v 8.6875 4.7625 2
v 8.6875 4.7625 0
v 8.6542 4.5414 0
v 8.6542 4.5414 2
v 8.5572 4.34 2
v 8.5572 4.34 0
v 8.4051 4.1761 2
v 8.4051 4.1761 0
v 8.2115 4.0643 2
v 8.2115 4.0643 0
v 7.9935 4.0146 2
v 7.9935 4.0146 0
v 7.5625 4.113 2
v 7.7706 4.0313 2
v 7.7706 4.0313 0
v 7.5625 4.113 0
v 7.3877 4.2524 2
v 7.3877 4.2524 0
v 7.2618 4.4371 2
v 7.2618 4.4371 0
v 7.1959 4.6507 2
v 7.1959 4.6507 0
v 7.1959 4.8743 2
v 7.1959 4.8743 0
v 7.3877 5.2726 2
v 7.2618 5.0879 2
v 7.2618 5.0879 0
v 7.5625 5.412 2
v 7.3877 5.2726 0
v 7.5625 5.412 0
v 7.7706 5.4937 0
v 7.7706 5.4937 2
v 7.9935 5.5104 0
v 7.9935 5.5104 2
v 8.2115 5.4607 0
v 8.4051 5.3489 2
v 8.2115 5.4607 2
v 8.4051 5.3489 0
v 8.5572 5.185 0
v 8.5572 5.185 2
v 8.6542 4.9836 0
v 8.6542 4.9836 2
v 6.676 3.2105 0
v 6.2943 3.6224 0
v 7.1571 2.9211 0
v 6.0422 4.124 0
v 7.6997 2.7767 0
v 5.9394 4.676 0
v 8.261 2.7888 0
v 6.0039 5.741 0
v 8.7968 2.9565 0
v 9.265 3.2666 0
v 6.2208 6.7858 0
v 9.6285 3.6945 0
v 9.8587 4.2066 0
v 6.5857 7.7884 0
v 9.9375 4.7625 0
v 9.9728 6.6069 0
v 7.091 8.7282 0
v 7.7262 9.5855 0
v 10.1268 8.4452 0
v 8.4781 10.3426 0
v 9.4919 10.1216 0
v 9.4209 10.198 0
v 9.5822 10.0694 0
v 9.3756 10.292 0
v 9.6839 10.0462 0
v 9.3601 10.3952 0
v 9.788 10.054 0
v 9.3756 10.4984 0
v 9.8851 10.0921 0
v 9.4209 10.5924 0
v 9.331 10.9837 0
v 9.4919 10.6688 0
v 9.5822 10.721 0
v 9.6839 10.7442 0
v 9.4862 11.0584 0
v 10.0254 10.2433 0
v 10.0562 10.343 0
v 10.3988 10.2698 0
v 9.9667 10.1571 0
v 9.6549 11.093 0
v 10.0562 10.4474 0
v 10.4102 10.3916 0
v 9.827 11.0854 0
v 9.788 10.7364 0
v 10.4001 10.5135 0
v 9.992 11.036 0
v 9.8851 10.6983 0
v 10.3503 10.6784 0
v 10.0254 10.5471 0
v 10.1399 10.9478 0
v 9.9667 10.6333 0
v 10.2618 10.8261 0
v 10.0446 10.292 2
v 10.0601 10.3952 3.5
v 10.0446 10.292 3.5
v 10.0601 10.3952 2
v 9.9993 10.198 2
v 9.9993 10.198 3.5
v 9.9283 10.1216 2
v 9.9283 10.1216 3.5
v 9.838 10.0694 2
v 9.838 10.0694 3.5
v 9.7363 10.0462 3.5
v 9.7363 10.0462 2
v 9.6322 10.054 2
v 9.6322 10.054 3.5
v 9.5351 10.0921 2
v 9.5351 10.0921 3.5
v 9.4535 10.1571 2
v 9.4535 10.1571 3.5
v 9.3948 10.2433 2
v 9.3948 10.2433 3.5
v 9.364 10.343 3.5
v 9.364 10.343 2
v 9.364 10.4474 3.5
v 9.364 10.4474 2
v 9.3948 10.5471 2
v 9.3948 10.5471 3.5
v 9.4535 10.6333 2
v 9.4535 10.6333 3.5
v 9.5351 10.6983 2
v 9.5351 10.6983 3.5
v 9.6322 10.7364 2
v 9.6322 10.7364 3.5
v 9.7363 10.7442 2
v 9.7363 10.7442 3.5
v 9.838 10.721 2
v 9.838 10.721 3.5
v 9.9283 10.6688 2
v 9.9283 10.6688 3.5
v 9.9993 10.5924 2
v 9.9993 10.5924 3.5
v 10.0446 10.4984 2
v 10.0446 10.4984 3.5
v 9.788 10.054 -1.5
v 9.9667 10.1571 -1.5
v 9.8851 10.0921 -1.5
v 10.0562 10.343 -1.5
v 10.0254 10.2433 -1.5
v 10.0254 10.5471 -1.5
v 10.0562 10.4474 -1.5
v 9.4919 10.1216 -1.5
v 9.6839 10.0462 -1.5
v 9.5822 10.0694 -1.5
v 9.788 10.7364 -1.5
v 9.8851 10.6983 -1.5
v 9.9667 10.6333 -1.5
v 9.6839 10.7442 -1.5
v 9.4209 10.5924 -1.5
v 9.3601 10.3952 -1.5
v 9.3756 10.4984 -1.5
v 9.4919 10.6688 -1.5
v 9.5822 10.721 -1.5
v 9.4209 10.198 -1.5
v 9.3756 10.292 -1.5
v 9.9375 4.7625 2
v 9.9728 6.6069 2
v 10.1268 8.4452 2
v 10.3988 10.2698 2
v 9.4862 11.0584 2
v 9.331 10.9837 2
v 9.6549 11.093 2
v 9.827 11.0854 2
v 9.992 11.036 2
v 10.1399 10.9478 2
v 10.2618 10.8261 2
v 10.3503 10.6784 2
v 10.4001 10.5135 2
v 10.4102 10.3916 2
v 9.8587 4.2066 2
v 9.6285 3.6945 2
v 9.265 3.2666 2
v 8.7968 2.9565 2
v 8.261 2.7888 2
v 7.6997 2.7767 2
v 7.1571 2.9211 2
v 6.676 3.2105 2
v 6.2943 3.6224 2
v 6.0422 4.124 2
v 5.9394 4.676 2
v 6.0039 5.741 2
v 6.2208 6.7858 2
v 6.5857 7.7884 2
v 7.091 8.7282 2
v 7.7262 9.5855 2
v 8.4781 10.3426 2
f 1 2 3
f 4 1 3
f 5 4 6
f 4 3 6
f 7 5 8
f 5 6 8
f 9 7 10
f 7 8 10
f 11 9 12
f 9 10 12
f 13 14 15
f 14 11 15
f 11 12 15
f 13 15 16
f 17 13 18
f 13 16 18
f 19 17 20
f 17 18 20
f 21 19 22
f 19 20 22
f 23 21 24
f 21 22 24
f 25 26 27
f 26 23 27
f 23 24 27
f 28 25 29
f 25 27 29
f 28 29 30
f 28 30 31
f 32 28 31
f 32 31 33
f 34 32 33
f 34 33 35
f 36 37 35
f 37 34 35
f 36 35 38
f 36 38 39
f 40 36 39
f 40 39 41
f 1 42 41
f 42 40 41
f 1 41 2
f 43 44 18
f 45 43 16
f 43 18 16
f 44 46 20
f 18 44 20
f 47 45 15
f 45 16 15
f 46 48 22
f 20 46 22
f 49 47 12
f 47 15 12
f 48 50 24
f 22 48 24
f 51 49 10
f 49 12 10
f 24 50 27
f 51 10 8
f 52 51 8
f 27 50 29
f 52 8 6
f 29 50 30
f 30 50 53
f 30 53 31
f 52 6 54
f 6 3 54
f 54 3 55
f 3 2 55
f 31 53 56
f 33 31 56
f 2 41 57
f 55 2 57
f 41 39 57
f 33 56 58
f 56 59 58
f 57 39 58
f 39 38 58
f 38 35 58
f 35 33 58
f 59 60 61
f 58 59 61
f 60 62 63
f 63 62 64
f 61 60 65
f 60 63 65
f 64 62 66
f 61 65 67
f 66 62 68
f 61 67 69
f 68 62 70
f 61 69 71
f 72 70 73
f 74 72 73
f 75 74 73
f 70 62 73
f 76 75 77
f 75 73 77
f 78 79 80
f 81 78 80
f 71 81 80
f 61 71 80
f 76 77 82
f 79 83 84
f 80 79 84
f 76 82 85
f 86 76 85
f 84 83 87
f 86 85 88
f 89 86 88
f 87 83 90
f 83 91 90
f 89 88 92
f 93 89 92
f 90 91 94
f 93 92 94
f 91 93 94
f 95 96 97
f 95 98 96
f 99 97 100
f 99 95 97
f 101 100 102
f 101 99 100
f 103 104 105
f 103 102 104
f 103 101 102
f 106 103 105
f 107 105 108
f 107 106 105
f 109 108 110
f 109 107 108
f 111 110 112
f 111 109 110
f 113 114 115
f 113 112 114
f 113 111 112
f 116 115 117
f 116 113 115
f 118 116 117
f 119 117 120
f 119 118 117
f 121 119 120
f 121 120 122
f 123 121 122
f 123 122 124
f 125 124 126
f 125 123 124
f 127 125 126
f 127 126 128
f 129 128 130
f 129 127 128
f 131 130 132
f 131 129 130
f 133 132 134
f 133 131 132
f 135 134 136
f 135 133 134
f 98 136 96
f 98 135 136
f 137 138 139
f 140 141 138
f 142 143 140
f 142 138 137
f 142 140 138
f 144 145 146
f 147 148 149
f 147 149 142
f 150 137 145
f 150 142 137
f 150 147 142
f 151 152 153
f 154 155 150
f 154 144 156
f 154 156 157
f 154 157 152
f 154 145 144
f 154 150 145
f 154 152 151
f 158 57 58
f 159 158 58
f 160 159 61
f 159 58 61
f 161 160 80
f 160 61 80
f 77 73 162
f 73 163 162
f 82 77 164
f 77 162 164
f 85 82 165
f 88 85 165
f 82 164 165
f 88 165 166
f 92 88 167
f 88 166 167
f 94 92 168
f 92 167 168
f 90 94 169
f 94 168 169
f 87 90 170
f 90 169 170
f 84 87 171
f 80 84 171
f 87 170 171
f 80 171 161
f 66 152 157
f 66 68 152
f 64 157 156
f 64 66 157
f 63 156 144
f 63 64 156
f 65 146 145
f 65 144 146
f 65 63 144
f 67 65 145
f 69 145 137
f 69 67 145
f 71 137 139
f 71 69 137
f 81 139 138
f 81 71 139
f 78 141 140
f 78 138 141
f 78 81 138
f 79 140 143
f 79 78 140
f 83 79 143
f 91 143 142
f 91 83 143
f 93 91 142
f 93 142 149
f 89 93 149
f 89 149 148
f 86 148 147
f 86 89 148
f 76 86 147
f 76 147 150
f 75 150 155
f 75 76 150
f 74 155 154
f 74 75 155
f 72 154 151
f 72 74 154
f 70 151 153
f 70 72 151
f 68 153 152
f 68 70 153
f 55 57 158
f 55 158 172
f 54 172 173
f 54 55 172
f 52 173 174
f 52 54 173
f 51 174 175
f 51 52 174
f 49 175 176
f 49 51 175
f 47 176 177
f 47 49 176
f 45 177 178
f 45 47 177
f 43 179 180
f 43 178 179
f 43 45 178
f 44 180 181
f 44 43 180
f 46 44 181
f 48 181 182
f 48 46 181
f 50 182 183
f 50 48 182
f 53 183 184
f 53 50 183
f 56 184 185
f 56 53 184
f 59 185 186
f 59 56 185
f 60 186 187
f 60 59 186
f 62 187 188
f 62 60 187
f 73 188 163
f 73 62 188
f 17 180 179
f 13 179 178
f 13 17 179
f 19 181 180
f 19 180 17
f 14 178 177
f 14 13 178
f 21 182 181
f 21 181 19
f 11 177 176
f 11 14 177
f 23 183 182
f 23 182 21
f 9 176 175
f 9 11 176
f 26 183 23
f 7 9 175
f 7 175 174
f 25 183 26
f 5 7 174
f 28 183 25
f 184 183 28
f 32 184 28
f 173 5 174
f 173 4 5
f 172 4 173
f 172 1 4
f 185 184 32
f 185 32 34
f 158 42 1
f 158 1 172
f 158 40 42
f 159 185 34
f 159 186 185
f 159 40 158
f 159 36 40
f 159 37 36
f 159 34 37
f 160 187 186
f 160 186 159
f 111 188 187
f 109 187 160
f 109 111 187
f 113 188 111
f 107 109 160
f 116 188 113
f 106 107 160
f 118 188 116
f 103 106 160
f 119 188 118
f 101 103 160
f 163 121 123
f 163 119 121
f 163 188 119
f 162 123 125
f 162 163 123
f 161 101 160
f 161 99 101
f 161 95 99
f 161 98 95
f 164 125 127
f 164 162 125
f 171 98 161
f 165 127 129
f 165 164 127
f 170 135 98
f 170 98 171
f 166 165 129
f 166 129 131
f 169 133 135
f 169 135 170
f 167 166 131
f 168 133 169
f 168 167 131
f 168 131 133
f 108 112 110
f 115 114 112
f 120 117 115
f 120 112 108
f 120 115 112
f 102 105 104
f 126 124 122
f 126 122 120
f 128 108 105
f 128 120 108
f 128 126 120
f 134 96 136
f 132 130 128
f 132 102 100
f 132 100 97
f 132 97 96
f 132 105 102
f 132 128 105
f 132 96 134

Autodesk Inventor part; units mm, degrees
ref_plane "YZ Plane" through (0, 0, 0) normal (1, 0, 0) x (0, 1, 0)
ref_plane "XZ Plane" through (0, 0, 0) normal (0, 1, 0) x (-1, 0, 0)
ref_plane "XY Plane" through (0, 0, 0) normal (0, 0, 1) x (1, 0, 0)
sketch "Sketch1" plane through (0, 0, 0) normal (0, 0, 1) x (1, 0, 0)
  line L0 (0, 0) -> (20, 0) construction
  line L1 (20, 0) -> (20, 20) construction
  line L2 (20, 20) -> (0, 20) construction
  line L3 (0, 20) -> (0, 0) construction
  circle A0 centre (7.9375, 4.7625) radius 2
  circle A1 centre (7.9375, 4.7625) radius 0.75
  arc A2 (10.691, 11.6731) -> (5.9394, 4.676) centre (13.3396, 4.7625) ccw
  arc A3 (10.691, 11.6731) -> (9.9375, 4.7625) centre (38.5656, 5.1375) ccw
  dimension "d0" = 20
  dimension "d1" = 20
  dimension "d2" = 4
  dimension "d3" = 1.5
extrude "Extrusion1" add sketch "Sketch1" along normal blind 2 contours A0 A2 A3
fillet "Fillet2" radius 0.7 1 edges at (10.691, 11.6731, 1)
sketch "Sketch2" plane through (0, 0, 2) normal (0, 0, 1) x (1, 0, 0)
  arc A0 (5.9394, 4.676) -> (9.9375, 4.7625) centre (7.9375, 4.7625) ccw projected
  circle A1 centre (7.9375, 4.7625) radius 0.75 projected
  arc A2 (10.3988, 10.2697) -> (9.9375, 4.7625) centre (38.5656, 5.1375) ccw projected
  arc A3 (9.331, 10.9836) -> (5.9394, 4.676) centre (13.3396, 4.7625) ccw projected
  arc A4 (10.3988, 10.2697) -> (9.331, 10.9836) centre (9.7101, 10.3952) ccw projected
  circle A5 centre (9.7101, 10.3952) radius 0.35
  point P0 (0, 0)
  dimension "d16" = 0.7
extrude "Extrusion2" add sketch "Sketch2" along normal blind 1.5 contours A5
sketch "Sketch3" plane through (0, 0, 0) normal (0, 0, -1) x (-1, 0, 0)
  arc A0 (-9.9375, 4.7625) -> (-5.9394, 4.676) centre (-7.9375, 4.7625) ccw projected
  circle A1 centre (-7.9375, 4.7625) radius 0.75 projected
  arc A2 (-5.9394, 4.676) -> (-9.331, 10.9836) centre (-13.3396, 4.7625) ccw projected
  arc A3 (-9.9375, 4.7625) -> (-10.3988, 10.2697) centre (-38.5656, 5.1375) ccw projected
  arc A4 (-9.331, 10.9836) -> (-10.3988, 10.2697) centre (-9.7101, 10.3952) ccw projected
  circle A5 centre (-9.7101, 10.3952) radius 0.35
  point P0 (0, 0)
  dimension "d17" = 0.7
extrude "Extrusion3" add sketch "Sketch3" along normal blind 1.5 contours A5
properties material "Liga de Nickel-Copper 400"
